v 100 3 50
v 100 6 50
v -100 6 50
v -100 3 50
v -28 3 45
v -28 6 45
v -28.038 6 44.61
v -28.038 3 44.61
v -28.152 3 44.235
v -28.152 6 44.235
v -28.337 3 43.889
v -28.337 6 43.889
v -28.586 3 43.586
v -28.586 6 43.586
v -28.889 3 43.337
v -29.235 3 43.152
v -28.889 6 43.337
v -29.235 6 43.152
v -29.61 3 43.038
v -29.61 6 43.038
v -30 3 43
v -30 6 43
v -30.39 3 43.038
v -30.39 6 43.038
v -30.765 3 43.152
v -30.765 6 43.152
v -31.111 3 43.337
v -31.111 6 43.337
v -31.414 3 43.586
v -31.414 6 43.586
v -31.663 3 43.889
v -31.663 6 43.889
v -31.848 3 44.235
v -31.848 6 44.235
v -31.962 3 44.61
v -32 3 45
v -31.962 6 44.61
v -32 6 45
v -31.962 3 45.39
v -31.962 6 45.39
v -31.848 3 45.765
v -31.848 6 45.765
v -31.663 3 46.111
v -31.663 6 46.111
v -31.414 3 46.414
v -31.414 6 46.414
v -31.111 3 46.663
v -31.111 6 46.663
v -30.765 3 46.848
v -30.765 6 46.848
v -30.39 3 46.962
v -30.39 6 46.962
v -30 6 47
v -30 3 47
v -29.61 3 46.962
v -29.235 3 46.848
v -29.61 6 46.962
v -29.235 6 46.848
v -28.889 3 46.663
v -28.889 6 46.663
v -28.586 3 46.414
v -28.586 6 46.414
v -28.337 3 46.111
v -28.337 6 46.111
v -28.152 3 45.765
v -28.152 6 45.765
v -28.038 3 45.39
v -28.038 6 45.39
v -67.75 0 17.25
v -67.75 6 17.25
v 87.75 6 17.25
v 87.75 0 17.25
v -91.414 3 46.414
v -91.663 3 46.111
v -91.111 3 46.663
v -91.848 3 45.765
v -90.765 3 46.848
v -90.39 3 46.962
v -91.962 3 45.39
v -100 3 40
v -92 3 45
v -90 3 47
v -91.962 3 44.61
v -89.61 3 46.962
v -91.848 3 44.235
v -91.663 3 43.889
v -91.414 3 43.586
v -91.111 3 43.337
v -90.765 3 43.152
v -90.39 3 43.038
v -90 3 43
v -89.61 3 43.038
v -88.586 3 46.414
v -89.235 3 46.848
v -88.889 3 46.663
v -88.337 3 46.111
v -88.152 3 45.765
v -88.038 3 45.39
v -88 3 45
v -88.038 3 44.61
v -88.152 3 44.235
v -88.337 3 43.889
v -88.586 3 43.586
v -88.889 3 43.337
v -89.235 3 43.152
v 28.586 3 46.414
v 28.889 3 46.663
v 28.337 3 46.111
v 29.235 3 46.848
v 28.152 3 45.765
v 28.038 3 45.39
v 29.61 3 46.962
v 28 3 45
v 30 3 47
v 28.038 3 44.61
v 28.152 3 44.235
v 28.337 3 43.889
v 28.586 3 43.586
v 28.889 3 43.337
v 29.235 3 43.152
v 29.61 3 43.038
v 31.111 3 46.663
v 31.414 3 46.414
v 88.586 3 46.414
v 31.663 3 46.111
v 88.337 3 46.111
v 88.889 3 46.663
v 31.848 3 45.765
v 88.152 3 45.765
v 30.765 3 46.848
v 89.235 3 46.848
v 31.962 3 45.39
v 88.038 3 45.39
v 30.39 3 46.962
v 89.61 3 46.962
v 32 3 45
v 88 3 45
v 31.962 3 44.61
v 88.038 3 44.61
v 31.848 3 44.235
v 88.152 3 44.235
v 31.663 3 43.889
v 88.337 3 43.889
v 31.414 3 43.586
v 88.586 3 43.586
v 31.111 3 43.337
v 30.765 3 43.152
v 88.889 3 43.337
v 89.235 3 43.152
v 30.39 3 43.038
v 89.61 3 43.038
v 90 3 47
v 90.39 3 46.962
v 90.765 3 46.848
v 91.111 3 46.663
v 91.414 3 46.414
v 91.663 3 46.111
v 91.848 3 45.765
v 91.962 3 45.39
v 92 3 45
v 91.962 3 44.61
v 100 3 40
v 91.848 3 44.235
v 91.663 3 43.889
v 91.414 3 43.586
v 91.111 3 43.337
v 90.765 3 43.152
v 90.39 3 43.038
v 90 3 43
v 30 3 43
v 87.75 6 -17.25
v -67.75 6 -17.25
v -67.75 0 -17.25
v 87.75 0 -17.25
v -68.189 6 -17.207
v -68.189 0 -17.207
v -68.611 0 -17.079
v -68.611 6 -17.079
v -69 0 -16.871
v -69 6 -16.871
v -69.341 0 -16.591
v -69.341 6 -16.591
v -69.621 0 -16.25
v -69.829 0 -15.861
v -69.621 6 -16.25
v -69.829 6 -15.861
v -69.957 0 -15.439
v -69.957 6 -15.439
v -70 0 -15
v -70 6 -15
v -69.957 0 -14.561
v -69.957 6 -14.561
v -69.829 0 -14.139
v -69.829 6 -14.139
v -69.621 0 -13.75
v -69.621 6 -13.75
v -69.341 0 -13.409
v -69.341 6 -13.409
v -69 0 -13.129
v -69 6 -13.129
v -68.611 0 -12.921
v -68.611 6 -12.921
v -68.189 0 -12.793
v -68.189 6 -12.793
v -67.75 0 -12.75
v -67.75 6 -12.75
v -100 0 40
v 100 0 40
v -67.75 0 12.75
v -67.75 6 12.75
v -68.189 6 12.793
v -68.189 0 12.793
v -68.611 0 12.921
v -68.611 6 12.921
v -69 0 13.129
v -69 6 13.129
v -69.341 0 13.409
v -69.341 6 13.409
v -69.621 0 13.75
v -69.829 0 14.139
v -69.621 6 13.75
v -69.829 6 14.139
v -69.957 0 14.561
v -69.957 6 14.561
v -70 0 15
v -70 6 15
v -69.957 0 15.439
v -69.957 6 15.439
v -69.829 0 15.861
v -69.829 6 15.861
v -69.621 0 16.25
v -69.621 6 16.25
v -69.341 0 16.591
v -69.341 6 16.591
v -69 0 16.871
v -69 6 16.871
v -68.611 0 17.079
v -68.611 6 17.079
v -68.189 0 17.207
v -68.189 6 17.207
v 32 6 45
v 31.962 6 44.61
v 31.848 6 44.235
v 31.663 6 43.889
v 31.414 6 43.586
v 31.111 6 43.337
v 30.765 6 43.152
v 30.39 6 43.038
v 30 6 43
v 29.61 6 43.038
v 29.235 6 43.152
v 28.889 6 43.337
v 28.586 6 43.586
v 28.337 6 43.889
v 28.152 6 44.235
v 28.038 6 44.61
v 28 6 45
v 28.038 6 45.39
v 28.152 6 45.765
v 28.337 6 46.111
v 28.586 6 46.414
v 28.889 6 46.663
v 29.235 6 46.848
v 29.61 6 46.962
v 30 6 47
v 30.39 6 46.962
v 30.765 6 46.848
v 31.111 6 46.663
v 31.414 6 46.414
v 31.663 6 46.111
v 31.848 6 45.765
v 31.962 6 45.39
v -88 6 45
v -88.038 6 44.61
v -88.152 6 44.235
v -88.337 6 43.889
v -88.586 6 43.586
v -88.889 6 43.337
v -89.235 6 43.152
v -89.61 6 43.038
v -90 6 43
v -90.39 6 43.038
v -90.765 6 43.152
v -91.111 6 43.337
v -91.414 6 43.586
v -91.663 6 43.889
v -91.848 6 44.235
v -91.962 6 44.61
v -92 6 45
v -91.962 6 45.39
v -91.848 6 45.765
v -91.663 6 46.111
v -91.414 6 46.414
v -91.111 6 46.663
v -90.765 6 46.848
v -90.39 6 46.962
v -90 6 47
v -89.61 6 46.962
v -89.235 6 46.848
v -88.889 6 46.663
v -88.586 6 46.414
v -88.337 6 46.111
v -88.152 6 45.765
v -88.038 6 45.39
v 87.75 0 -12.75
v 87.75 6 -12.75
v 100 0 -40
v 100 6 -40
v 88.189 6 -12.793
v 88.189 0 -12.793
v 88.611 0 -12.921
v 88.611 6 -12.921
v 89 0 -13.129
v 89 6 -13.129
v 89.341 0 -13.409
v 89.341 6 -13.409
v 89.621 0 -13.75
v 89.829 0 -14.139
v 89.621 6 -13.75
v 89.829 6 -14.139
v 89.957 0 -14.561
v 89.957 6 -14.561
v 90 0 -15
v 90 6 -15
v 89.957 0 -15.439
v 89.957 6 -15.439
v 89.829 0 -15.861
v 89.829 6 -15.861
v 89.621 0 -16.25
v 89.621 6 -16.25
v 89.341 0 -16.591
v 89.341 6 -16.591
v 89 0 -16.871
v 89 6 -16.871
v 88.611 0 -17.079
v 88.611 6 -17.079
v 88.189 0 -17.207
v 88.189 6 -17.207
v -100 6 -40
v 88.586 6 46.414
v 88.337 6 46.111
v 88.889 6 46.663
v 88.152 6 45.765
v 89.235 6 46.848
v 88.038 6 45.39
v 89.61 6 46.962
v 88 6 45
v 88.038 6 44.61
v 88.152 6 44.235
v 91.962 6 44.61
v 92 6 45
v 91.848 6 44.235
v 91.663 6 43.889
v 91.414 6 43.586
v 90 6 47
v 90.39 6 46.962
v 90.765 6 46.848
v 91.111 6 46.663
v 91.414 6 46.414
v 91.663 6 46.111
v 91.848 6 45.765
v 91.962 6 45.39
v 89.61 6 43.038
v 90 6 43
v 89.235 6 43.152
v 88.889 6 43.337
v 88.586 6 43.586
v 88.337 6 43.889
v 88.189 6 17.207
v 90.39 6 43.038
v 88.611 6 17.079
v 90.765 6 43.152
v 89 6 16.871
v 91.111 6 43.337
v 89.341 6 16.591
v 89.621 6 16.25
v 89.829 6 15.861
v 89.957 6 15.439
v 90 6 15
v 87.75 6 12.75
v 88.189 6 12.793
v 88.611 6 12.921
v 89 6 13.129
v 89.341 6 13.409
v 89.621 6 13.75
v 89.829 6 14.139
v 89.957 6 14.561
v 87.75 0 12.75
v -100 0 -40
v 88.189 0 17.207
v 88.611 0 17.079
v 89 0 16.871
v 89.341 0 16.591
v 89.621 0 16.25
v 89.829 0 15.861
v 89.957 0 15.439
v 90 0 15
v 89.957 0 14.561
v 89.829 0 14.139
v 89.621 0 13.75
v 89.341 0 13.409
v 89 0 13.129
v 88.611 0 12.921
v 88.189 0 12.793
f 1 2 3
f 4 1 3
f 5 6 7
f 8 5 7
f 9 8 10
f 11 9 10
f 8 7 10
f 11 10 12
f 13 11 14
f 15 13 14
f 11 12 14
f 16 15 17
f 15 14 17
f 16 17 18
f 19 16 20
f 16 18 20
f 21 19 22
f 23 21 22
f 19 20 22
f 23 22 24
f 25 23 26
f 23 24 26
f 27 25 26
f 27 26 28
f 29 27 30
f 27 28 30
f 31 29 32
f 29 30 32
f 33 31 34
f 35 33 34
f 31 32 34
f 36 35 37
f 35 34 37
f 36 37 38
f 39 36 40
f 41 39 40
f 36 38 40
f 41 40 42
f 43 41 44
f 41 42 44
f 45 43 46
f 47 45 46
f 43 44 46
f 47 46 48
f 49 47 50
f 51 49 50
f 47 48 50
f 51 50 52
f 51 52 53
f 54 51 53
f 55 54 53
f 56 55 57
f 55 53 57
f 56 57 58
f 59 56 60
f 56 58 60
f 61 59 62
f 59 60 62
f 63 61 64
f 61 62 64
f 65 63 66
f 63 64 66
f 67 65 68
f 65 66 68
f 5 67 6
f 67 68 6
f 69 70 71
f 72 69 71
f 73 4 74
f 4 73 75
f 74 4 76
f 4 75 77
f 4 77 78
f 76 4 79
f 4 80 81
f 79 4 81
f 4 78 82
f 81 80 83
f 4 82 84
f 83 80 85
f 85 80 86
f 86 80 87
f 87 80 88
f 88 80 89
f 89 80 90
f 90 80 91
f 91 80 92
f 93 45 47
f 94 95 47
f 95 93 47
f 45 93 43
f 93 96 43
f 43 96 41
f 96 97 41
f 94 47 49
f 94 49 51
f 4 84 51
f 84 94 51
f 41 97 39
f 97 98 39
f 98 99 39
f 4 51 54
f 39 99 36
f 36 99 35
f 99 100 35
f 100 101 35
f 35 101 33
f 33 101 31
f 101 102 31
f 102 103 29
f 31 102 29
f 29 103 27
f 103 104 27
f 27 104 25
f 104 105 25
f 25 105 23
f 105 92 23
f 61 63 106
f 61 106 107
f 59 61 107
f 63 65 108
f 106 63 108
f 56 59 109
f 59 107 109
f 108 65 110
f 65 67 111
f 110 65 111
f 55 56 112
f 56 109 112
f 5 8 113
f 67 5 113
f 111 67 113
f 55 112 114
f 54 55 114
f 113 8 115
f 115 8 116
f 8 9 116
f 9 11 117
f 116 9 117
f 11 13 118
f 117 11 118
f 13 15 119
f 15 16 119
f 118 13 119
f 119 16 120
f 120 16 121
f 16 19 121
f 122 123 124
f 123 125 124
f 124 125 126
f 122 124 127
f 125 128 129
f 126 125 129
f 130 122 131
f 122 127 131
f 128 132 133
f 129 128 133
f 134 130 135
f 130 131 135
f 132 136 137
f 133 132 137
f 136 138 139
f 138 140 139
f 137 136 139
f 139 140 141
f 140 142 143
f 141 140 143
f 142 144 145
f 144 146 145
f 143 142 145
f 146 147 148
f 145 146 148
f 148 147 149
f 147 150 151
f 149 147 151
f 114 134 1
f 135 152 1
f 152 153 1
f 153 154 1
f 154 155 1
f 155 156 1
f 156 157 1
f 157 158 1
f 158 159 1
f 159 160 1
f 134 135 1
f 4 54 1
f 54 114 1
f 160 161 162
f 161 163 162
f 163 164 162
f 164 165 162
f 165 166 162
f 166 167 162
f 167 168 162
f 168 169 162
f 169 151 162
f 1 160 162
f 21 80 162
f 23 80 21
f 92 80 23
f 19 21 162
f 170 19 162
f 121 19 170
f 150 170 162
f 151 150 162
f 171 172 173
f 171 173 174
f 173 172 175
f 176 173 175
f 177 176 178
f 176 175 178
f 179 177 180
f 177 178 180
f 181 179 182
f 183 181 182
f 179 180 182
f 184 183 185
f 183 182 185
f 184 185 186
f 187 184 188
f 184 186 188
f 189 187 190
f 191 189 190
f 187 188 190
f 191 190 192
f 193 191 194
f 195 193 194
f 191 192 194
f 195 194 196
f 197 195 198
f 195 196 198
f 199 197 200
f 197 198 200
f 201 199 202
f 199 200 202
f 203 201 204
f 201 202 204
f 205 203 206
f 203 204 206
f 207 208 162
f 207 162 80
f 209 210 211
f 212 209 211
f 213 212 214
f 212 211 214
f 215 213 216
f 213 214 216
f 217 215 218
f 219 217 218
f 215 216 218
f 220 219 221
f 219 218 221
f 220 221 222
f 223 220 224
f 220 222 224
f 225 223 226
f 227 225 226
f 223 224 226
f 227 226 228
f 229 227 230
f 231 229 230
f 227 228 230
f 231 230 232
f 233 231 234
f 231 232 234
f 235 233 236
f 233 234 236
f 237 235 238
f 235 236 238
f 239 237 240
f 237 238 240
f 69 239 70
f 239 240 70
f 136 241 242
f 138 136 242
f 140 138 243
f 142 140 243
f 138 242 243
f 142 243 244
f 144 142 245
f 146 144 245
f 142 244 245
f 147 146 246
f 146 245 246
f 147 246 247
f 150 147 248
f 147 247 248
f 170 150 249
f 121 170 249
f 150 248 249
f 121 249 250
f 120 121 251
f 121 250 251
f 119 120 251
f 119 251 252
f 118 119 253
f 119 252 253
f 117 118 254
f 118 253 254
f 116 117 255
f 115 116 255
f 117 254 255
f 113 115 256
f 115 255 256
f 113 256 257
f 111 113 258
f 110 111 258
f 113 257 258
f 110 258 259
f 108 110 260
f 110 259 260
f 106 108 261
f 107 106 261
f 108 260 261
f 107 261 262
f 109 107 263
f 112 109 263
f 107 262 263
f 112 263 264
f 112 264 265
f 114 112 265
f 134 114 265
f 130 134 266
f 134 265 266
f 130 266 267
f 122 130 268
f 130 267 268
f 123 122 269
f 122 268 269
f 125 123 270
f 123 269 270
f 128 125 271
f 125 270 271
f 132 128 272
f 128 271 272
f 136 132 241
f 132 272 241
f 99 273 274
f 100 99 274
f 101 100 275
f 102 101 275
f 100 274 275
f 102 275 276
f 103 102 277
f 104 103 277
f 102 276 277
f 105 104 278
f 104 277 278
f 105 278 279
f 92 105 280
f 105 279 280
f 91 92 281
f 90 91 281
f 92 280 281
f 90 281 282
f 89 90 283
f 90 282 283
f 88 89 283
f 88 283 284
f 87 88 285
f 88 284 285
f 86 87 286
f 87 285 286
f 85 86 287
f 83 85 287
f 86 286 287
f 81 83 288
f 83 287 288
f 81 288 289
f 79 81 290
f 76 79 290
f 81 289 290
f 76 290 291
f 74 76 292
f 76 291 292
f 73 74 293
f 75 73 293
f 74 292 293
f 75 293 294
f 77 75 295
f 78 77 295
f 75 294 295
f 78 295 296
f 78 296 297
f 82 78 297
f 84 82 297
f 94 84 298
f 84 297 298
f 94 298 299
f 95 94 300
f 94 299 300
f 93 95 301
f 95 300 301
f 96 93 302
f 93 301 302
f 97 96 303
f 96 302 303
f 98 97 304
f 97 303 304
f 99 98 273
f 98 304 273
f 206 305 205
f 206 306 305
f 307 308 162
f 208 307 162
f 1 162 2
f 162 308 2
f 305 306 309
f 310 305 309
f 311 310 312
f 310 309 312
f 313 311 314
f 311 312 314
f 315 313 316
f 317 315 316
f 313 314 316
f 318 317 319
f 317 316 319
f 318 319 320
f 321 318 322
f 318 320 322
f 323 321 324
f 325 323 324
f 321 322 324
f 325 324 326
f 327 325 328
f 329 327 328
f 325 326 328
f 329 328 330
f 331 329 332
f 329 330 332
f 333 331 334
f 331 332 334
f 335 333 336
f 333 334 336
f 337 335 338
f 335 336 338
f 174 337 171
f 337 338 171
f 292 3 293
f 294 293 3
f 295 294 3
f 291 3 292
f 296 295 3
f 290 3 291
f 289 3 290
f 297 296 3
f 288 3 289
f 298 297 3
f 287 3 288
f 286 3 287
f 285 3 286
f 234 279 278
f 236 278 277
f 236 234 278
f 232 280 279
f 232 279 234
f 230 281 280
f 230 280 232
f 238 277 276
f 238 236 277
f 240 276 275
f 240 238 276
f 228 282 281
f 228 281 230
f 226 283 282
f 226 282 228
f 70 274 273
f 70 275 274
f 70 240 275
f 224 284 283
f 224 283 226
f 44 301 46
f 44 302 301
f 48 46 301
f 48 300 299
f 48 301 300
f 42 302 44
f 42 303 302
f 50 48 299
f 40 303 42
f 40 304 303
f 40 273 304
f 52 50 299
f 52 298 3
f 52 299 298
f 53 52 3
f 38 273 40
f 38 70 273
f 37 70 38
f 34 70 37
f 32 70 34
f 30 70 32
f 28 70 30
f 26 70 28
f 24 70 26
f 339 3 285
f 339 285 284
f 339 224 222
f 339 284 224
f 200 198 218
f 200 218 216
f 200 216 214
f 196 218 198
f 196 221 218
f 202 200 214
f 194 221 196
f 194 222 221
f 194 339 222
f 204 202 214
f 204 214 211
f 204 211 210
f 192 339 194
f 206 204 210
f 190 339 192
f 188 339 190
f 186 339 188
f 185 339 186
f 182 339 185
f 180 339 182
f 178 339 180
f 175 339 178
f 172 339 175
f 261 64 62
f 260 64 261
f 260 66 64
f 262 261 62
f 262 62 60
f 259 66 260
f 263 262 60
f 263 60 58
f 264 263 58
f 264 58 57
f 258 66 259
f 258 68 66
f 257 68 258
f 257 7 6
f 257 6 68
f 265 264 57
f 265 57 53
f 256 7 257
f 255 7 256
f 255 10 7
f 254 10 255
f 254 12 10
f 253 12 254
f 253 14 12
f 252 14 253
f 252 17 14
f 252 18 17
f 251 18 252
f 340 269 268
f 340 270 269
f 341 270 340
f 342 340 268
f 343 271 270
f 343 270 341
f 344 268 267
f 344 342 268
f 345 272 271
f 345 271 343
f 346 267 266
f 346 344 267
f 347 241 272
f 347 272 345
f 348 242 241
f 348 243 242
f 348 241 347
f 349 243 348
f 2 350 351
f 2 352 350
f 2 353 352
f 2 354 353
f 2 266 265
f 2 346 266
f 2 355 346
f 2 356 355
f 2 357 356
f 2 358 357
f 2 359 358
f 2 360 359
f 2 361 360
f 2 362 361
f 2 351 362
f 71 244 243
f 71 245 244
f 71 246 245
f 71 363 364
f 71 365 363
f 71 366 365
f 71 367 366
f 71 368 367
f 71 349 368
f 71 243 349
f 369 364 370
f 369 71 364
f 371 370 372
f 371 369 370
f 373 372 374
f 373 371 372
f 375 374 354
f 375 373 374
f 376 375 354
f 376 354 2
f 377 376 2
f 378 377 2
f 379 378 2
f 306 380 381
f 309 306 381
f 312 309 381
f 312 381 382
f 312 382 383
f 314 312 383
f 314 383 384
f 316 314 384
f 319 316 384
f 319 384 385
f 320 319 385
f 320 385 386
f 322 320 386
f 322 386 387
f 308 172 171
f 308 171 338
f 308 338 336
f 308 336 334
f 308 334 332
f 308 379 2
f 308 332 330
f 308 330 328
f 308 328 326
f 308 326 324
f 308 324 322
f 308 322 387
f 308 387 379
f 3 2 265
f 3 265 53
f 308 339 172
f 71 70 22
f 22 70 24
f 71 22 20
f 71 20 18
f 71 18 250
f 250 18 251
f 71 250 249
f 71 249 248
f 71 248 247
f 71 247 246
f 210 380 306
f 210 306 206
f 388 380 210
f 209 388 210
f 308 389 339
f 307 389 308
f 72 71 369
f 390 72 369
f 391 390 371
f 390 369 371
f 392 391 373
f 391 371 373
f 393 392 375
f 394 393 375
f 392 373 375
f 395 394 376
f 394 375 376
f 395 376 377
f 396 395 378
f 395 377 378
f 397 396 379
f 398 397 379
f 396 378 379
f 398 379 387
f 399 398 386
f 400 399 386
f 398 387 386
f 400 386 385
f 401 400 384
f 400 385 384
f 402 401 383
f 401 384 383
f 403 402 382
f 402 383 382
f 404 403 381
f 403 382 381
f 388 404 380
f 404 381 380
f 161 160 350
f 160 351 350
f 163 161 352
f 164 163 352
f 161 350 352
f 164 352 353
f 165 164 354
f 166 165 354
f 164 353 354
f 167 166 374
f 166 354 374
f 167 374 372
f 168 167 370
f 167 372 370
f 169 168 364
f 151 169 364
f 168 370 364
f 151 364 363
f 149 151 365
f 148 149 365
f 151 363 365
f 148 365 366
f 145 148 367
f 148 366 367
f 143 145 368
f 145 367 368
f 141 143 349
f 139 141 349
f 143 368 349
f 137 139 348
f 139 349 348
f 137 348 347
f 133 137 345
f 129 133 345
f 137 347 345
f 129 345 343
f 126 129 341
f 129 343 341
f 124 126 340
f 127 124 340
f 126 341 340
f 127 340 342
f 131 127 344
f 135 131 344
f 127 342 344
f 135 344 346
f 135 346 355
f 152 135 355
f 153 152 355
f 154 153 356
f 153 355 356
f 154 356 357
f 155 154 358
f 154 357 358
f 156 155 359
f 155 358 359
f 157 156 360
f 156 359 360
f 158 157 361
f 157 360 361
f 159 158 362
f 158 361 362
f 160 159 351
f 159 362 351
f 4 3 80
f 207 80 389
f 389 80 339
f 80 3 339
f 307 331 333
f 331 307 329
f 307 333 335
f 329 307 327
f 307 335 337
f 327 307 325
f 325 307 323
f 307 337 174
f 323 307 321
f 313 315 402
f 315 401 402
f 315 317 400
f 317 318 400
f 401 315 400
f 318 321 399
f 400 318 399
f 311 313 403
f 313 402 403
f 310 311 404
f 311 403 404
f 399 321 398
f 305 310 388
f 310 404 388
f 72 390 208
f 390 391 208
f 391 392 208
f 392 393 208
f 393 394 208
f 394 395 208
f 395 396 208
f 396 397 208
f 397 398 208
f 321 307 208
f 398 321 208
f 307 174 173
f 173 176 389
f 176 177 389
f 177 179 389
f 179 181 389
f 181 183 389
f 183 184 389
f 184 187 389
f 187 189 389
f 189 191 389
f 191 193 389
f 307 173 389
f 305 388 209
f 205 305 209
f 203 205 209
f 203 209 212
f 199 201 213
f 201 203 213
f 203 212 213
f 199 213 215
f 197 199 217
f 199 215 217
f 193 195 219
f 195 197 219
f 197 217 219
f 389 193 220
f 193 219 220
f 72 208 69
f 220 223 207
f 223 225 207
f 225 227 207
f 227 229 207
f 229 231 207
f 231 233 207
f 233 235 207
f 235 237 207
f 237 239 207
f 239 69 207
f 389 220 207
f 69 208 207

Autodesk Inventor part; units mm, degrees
ref_plane "YZ Plane" through (0, 0, 0) normal (1, 0, 0) x (0, 1, 0)
ref_plane "XZ Plane" through (0, 0, 0) normal (0, 1, 0) x (-1, 0, 0)
ref_plane "XY Plane" through (0, 0, 0) normal (0, 0, 1) x (1, 0, 0)
sketch "Boceto1" plane through (0, 0, 0) normal (0, 1, 0) x (-1, 0, 0)
  line L0 (-100, 40) -> (100, 40)
  line L1 (100, 40) -> (100, -40)
  line L2 (100, -40) -> (-100, -40)
  line L3 (-100, -40) -> (-100, 40)
  line L4 (-100, 40) -> (100, -40) construction
  line L5 (100, 40) -> (-100, -40) construction
  point P0 (0, 0)
  dimension "d0" = 200
  dimension "d1" = 80
extrude "Extrusión1" add sketch "Boceto1" along normal blind 6
sketch "Boceto2" plane through (0, 6, 0) normal (0, 1, 0) x (1, 0, 0)
  line L0 (-67.75, -17.25) -> (87.75, -17.25)
  line L1 (90, -15) -> (90, -15)
  line L2 (87.75, -12.75) -> (-67.75, -12.75)
  line L3 (-70, -15) -> (-70, -15)
  line L4 (0, 0) -> (-99.8063, 0) construction
  line L5 (100, -40) -> (100, 40) construction
  line L6 (100, 40) -> (-100, 40) construction
  line L7 (-100, 40) -> (-100, -40) construction
  line L8 (-100, -40) -> (100, -40) construction
  line L9 (100, -40) -> (100, 40) construction
  arc A0 (-70, -15) -> (-67.75, -17.25) centre (-67.75, -15) ccw
  arc A1 (-67.75, -12.75) -> (-70, -15) centre (-67.75, -15) ccw
  arc A2 (87.75, -17.25) -> (90, -15) centre (87.75, -15) ccw
  arc A3 (90, -15) -> (87.75, -12.75) centre (87.75, -15) ccw
  line L10 (-67.75, 17.25) -> (87.75, 17.25)
  line L11 (87.75, 12.75) -> (-67.75, 12.75)
  arc A4 (-67.75, 17.25) -> (-70, 15) centre (-67.75, 15) ccw
  arc A5 (-70, 15) -> (-67.75, 12.75) centre (-67.75, 15) ccw
  arc A6 (90, 15) -> (87.75, 17.25) centre (87.75, 15) ccw
  arc A7 (87.75, 12.75) -> (90, 15) centre (87.75, 15) ccw
  dimension "d4" = 12.75
  dimension "d5" = 4.5
  dimension "d6" = 10
  dimension "d7" = 30
  dimension "d8" = 2.25
  dimension "d9" = 2.25
  dimension "d10" = 2.25
extrude "Extrusión2" cut sketch "Boceto2" against normal blind 6
sketch "Boceto3" plane through (0, 6, 0) normal (0, 1, 0) x (1, 0, 0)
  line L0 (-67.75, -12.75) -> (87.75, -12.75) projected
  arc A0 (87.75, -17.25) -> (87.75, -12.75) centre (87.75, -15) ccw projected
  line L1 (87.75, -17.25) -> (-67.75, -17.25) projected
  arc A1 (-67.75, -12.75) -> (-67.75, -17.25) centre (-67.75, -15) ccw projected
  arc A2 (-67.75, 17.25) -> (-67.75, 12.75) centre (-67.75, 15) ccw projected
  line L2 (-67.75, 17.25) -> (87.75, 17.25) projected
  arc A3 (87.75, 12.75) -> (87.75, 17.25) centre (87.75, 15) ccw projected
  line L3 (87.75, 12.75) -> (-67.75, 12.75) projected
  line L4 (100, 40) -> (-100, 40) projected
  line L5 (-100, 40) -> (-100, -40) projected
  line L6 (-100, -40) -> (100, -40) projected
  line L7 (100, -40) -> (100, 40) projected
  line L8 (-100, -40) -> (100, -40)
  line L9 (100, -40) -> (100, -50)
  line L10 (100, -50) -> (-100, -50)
  line L11 (-100, -50) -> (-100, -40)
  point P0 (0, 0)
  dimension "d13" = 10
extrude "Extrusión3" add sketch "Boceto3" against normal blind 3 contours L9 L10 L11 L6
sketch "Boceto4" plane through (0, 6, 0) normal (0, 1, 0) x (1, 0, 0)
  line L0 (-100, -50) -> (100, -50) projected
  line L1 (-100, -45) -> (100, -45) construction
  circle A0 centre (-90, -45) radius 2
  line L2 (-100, 40) -> (-100, -50) projected
  circle A1 centre (-30, -45) radius 2
  circle A2 centre (30, -45) radius 2
  circle A3 centre (90, -45) radius 2
  point P0 (0, 0)
  dimension "d16" = 5
  dimension "d17" = 4
  dimension "d18" = 10
  dimension "d21" = 60
extrude "Extrusión4" cut sketch "Boceto4" against normal blind 3
properties part number "MesaDePruebas"
